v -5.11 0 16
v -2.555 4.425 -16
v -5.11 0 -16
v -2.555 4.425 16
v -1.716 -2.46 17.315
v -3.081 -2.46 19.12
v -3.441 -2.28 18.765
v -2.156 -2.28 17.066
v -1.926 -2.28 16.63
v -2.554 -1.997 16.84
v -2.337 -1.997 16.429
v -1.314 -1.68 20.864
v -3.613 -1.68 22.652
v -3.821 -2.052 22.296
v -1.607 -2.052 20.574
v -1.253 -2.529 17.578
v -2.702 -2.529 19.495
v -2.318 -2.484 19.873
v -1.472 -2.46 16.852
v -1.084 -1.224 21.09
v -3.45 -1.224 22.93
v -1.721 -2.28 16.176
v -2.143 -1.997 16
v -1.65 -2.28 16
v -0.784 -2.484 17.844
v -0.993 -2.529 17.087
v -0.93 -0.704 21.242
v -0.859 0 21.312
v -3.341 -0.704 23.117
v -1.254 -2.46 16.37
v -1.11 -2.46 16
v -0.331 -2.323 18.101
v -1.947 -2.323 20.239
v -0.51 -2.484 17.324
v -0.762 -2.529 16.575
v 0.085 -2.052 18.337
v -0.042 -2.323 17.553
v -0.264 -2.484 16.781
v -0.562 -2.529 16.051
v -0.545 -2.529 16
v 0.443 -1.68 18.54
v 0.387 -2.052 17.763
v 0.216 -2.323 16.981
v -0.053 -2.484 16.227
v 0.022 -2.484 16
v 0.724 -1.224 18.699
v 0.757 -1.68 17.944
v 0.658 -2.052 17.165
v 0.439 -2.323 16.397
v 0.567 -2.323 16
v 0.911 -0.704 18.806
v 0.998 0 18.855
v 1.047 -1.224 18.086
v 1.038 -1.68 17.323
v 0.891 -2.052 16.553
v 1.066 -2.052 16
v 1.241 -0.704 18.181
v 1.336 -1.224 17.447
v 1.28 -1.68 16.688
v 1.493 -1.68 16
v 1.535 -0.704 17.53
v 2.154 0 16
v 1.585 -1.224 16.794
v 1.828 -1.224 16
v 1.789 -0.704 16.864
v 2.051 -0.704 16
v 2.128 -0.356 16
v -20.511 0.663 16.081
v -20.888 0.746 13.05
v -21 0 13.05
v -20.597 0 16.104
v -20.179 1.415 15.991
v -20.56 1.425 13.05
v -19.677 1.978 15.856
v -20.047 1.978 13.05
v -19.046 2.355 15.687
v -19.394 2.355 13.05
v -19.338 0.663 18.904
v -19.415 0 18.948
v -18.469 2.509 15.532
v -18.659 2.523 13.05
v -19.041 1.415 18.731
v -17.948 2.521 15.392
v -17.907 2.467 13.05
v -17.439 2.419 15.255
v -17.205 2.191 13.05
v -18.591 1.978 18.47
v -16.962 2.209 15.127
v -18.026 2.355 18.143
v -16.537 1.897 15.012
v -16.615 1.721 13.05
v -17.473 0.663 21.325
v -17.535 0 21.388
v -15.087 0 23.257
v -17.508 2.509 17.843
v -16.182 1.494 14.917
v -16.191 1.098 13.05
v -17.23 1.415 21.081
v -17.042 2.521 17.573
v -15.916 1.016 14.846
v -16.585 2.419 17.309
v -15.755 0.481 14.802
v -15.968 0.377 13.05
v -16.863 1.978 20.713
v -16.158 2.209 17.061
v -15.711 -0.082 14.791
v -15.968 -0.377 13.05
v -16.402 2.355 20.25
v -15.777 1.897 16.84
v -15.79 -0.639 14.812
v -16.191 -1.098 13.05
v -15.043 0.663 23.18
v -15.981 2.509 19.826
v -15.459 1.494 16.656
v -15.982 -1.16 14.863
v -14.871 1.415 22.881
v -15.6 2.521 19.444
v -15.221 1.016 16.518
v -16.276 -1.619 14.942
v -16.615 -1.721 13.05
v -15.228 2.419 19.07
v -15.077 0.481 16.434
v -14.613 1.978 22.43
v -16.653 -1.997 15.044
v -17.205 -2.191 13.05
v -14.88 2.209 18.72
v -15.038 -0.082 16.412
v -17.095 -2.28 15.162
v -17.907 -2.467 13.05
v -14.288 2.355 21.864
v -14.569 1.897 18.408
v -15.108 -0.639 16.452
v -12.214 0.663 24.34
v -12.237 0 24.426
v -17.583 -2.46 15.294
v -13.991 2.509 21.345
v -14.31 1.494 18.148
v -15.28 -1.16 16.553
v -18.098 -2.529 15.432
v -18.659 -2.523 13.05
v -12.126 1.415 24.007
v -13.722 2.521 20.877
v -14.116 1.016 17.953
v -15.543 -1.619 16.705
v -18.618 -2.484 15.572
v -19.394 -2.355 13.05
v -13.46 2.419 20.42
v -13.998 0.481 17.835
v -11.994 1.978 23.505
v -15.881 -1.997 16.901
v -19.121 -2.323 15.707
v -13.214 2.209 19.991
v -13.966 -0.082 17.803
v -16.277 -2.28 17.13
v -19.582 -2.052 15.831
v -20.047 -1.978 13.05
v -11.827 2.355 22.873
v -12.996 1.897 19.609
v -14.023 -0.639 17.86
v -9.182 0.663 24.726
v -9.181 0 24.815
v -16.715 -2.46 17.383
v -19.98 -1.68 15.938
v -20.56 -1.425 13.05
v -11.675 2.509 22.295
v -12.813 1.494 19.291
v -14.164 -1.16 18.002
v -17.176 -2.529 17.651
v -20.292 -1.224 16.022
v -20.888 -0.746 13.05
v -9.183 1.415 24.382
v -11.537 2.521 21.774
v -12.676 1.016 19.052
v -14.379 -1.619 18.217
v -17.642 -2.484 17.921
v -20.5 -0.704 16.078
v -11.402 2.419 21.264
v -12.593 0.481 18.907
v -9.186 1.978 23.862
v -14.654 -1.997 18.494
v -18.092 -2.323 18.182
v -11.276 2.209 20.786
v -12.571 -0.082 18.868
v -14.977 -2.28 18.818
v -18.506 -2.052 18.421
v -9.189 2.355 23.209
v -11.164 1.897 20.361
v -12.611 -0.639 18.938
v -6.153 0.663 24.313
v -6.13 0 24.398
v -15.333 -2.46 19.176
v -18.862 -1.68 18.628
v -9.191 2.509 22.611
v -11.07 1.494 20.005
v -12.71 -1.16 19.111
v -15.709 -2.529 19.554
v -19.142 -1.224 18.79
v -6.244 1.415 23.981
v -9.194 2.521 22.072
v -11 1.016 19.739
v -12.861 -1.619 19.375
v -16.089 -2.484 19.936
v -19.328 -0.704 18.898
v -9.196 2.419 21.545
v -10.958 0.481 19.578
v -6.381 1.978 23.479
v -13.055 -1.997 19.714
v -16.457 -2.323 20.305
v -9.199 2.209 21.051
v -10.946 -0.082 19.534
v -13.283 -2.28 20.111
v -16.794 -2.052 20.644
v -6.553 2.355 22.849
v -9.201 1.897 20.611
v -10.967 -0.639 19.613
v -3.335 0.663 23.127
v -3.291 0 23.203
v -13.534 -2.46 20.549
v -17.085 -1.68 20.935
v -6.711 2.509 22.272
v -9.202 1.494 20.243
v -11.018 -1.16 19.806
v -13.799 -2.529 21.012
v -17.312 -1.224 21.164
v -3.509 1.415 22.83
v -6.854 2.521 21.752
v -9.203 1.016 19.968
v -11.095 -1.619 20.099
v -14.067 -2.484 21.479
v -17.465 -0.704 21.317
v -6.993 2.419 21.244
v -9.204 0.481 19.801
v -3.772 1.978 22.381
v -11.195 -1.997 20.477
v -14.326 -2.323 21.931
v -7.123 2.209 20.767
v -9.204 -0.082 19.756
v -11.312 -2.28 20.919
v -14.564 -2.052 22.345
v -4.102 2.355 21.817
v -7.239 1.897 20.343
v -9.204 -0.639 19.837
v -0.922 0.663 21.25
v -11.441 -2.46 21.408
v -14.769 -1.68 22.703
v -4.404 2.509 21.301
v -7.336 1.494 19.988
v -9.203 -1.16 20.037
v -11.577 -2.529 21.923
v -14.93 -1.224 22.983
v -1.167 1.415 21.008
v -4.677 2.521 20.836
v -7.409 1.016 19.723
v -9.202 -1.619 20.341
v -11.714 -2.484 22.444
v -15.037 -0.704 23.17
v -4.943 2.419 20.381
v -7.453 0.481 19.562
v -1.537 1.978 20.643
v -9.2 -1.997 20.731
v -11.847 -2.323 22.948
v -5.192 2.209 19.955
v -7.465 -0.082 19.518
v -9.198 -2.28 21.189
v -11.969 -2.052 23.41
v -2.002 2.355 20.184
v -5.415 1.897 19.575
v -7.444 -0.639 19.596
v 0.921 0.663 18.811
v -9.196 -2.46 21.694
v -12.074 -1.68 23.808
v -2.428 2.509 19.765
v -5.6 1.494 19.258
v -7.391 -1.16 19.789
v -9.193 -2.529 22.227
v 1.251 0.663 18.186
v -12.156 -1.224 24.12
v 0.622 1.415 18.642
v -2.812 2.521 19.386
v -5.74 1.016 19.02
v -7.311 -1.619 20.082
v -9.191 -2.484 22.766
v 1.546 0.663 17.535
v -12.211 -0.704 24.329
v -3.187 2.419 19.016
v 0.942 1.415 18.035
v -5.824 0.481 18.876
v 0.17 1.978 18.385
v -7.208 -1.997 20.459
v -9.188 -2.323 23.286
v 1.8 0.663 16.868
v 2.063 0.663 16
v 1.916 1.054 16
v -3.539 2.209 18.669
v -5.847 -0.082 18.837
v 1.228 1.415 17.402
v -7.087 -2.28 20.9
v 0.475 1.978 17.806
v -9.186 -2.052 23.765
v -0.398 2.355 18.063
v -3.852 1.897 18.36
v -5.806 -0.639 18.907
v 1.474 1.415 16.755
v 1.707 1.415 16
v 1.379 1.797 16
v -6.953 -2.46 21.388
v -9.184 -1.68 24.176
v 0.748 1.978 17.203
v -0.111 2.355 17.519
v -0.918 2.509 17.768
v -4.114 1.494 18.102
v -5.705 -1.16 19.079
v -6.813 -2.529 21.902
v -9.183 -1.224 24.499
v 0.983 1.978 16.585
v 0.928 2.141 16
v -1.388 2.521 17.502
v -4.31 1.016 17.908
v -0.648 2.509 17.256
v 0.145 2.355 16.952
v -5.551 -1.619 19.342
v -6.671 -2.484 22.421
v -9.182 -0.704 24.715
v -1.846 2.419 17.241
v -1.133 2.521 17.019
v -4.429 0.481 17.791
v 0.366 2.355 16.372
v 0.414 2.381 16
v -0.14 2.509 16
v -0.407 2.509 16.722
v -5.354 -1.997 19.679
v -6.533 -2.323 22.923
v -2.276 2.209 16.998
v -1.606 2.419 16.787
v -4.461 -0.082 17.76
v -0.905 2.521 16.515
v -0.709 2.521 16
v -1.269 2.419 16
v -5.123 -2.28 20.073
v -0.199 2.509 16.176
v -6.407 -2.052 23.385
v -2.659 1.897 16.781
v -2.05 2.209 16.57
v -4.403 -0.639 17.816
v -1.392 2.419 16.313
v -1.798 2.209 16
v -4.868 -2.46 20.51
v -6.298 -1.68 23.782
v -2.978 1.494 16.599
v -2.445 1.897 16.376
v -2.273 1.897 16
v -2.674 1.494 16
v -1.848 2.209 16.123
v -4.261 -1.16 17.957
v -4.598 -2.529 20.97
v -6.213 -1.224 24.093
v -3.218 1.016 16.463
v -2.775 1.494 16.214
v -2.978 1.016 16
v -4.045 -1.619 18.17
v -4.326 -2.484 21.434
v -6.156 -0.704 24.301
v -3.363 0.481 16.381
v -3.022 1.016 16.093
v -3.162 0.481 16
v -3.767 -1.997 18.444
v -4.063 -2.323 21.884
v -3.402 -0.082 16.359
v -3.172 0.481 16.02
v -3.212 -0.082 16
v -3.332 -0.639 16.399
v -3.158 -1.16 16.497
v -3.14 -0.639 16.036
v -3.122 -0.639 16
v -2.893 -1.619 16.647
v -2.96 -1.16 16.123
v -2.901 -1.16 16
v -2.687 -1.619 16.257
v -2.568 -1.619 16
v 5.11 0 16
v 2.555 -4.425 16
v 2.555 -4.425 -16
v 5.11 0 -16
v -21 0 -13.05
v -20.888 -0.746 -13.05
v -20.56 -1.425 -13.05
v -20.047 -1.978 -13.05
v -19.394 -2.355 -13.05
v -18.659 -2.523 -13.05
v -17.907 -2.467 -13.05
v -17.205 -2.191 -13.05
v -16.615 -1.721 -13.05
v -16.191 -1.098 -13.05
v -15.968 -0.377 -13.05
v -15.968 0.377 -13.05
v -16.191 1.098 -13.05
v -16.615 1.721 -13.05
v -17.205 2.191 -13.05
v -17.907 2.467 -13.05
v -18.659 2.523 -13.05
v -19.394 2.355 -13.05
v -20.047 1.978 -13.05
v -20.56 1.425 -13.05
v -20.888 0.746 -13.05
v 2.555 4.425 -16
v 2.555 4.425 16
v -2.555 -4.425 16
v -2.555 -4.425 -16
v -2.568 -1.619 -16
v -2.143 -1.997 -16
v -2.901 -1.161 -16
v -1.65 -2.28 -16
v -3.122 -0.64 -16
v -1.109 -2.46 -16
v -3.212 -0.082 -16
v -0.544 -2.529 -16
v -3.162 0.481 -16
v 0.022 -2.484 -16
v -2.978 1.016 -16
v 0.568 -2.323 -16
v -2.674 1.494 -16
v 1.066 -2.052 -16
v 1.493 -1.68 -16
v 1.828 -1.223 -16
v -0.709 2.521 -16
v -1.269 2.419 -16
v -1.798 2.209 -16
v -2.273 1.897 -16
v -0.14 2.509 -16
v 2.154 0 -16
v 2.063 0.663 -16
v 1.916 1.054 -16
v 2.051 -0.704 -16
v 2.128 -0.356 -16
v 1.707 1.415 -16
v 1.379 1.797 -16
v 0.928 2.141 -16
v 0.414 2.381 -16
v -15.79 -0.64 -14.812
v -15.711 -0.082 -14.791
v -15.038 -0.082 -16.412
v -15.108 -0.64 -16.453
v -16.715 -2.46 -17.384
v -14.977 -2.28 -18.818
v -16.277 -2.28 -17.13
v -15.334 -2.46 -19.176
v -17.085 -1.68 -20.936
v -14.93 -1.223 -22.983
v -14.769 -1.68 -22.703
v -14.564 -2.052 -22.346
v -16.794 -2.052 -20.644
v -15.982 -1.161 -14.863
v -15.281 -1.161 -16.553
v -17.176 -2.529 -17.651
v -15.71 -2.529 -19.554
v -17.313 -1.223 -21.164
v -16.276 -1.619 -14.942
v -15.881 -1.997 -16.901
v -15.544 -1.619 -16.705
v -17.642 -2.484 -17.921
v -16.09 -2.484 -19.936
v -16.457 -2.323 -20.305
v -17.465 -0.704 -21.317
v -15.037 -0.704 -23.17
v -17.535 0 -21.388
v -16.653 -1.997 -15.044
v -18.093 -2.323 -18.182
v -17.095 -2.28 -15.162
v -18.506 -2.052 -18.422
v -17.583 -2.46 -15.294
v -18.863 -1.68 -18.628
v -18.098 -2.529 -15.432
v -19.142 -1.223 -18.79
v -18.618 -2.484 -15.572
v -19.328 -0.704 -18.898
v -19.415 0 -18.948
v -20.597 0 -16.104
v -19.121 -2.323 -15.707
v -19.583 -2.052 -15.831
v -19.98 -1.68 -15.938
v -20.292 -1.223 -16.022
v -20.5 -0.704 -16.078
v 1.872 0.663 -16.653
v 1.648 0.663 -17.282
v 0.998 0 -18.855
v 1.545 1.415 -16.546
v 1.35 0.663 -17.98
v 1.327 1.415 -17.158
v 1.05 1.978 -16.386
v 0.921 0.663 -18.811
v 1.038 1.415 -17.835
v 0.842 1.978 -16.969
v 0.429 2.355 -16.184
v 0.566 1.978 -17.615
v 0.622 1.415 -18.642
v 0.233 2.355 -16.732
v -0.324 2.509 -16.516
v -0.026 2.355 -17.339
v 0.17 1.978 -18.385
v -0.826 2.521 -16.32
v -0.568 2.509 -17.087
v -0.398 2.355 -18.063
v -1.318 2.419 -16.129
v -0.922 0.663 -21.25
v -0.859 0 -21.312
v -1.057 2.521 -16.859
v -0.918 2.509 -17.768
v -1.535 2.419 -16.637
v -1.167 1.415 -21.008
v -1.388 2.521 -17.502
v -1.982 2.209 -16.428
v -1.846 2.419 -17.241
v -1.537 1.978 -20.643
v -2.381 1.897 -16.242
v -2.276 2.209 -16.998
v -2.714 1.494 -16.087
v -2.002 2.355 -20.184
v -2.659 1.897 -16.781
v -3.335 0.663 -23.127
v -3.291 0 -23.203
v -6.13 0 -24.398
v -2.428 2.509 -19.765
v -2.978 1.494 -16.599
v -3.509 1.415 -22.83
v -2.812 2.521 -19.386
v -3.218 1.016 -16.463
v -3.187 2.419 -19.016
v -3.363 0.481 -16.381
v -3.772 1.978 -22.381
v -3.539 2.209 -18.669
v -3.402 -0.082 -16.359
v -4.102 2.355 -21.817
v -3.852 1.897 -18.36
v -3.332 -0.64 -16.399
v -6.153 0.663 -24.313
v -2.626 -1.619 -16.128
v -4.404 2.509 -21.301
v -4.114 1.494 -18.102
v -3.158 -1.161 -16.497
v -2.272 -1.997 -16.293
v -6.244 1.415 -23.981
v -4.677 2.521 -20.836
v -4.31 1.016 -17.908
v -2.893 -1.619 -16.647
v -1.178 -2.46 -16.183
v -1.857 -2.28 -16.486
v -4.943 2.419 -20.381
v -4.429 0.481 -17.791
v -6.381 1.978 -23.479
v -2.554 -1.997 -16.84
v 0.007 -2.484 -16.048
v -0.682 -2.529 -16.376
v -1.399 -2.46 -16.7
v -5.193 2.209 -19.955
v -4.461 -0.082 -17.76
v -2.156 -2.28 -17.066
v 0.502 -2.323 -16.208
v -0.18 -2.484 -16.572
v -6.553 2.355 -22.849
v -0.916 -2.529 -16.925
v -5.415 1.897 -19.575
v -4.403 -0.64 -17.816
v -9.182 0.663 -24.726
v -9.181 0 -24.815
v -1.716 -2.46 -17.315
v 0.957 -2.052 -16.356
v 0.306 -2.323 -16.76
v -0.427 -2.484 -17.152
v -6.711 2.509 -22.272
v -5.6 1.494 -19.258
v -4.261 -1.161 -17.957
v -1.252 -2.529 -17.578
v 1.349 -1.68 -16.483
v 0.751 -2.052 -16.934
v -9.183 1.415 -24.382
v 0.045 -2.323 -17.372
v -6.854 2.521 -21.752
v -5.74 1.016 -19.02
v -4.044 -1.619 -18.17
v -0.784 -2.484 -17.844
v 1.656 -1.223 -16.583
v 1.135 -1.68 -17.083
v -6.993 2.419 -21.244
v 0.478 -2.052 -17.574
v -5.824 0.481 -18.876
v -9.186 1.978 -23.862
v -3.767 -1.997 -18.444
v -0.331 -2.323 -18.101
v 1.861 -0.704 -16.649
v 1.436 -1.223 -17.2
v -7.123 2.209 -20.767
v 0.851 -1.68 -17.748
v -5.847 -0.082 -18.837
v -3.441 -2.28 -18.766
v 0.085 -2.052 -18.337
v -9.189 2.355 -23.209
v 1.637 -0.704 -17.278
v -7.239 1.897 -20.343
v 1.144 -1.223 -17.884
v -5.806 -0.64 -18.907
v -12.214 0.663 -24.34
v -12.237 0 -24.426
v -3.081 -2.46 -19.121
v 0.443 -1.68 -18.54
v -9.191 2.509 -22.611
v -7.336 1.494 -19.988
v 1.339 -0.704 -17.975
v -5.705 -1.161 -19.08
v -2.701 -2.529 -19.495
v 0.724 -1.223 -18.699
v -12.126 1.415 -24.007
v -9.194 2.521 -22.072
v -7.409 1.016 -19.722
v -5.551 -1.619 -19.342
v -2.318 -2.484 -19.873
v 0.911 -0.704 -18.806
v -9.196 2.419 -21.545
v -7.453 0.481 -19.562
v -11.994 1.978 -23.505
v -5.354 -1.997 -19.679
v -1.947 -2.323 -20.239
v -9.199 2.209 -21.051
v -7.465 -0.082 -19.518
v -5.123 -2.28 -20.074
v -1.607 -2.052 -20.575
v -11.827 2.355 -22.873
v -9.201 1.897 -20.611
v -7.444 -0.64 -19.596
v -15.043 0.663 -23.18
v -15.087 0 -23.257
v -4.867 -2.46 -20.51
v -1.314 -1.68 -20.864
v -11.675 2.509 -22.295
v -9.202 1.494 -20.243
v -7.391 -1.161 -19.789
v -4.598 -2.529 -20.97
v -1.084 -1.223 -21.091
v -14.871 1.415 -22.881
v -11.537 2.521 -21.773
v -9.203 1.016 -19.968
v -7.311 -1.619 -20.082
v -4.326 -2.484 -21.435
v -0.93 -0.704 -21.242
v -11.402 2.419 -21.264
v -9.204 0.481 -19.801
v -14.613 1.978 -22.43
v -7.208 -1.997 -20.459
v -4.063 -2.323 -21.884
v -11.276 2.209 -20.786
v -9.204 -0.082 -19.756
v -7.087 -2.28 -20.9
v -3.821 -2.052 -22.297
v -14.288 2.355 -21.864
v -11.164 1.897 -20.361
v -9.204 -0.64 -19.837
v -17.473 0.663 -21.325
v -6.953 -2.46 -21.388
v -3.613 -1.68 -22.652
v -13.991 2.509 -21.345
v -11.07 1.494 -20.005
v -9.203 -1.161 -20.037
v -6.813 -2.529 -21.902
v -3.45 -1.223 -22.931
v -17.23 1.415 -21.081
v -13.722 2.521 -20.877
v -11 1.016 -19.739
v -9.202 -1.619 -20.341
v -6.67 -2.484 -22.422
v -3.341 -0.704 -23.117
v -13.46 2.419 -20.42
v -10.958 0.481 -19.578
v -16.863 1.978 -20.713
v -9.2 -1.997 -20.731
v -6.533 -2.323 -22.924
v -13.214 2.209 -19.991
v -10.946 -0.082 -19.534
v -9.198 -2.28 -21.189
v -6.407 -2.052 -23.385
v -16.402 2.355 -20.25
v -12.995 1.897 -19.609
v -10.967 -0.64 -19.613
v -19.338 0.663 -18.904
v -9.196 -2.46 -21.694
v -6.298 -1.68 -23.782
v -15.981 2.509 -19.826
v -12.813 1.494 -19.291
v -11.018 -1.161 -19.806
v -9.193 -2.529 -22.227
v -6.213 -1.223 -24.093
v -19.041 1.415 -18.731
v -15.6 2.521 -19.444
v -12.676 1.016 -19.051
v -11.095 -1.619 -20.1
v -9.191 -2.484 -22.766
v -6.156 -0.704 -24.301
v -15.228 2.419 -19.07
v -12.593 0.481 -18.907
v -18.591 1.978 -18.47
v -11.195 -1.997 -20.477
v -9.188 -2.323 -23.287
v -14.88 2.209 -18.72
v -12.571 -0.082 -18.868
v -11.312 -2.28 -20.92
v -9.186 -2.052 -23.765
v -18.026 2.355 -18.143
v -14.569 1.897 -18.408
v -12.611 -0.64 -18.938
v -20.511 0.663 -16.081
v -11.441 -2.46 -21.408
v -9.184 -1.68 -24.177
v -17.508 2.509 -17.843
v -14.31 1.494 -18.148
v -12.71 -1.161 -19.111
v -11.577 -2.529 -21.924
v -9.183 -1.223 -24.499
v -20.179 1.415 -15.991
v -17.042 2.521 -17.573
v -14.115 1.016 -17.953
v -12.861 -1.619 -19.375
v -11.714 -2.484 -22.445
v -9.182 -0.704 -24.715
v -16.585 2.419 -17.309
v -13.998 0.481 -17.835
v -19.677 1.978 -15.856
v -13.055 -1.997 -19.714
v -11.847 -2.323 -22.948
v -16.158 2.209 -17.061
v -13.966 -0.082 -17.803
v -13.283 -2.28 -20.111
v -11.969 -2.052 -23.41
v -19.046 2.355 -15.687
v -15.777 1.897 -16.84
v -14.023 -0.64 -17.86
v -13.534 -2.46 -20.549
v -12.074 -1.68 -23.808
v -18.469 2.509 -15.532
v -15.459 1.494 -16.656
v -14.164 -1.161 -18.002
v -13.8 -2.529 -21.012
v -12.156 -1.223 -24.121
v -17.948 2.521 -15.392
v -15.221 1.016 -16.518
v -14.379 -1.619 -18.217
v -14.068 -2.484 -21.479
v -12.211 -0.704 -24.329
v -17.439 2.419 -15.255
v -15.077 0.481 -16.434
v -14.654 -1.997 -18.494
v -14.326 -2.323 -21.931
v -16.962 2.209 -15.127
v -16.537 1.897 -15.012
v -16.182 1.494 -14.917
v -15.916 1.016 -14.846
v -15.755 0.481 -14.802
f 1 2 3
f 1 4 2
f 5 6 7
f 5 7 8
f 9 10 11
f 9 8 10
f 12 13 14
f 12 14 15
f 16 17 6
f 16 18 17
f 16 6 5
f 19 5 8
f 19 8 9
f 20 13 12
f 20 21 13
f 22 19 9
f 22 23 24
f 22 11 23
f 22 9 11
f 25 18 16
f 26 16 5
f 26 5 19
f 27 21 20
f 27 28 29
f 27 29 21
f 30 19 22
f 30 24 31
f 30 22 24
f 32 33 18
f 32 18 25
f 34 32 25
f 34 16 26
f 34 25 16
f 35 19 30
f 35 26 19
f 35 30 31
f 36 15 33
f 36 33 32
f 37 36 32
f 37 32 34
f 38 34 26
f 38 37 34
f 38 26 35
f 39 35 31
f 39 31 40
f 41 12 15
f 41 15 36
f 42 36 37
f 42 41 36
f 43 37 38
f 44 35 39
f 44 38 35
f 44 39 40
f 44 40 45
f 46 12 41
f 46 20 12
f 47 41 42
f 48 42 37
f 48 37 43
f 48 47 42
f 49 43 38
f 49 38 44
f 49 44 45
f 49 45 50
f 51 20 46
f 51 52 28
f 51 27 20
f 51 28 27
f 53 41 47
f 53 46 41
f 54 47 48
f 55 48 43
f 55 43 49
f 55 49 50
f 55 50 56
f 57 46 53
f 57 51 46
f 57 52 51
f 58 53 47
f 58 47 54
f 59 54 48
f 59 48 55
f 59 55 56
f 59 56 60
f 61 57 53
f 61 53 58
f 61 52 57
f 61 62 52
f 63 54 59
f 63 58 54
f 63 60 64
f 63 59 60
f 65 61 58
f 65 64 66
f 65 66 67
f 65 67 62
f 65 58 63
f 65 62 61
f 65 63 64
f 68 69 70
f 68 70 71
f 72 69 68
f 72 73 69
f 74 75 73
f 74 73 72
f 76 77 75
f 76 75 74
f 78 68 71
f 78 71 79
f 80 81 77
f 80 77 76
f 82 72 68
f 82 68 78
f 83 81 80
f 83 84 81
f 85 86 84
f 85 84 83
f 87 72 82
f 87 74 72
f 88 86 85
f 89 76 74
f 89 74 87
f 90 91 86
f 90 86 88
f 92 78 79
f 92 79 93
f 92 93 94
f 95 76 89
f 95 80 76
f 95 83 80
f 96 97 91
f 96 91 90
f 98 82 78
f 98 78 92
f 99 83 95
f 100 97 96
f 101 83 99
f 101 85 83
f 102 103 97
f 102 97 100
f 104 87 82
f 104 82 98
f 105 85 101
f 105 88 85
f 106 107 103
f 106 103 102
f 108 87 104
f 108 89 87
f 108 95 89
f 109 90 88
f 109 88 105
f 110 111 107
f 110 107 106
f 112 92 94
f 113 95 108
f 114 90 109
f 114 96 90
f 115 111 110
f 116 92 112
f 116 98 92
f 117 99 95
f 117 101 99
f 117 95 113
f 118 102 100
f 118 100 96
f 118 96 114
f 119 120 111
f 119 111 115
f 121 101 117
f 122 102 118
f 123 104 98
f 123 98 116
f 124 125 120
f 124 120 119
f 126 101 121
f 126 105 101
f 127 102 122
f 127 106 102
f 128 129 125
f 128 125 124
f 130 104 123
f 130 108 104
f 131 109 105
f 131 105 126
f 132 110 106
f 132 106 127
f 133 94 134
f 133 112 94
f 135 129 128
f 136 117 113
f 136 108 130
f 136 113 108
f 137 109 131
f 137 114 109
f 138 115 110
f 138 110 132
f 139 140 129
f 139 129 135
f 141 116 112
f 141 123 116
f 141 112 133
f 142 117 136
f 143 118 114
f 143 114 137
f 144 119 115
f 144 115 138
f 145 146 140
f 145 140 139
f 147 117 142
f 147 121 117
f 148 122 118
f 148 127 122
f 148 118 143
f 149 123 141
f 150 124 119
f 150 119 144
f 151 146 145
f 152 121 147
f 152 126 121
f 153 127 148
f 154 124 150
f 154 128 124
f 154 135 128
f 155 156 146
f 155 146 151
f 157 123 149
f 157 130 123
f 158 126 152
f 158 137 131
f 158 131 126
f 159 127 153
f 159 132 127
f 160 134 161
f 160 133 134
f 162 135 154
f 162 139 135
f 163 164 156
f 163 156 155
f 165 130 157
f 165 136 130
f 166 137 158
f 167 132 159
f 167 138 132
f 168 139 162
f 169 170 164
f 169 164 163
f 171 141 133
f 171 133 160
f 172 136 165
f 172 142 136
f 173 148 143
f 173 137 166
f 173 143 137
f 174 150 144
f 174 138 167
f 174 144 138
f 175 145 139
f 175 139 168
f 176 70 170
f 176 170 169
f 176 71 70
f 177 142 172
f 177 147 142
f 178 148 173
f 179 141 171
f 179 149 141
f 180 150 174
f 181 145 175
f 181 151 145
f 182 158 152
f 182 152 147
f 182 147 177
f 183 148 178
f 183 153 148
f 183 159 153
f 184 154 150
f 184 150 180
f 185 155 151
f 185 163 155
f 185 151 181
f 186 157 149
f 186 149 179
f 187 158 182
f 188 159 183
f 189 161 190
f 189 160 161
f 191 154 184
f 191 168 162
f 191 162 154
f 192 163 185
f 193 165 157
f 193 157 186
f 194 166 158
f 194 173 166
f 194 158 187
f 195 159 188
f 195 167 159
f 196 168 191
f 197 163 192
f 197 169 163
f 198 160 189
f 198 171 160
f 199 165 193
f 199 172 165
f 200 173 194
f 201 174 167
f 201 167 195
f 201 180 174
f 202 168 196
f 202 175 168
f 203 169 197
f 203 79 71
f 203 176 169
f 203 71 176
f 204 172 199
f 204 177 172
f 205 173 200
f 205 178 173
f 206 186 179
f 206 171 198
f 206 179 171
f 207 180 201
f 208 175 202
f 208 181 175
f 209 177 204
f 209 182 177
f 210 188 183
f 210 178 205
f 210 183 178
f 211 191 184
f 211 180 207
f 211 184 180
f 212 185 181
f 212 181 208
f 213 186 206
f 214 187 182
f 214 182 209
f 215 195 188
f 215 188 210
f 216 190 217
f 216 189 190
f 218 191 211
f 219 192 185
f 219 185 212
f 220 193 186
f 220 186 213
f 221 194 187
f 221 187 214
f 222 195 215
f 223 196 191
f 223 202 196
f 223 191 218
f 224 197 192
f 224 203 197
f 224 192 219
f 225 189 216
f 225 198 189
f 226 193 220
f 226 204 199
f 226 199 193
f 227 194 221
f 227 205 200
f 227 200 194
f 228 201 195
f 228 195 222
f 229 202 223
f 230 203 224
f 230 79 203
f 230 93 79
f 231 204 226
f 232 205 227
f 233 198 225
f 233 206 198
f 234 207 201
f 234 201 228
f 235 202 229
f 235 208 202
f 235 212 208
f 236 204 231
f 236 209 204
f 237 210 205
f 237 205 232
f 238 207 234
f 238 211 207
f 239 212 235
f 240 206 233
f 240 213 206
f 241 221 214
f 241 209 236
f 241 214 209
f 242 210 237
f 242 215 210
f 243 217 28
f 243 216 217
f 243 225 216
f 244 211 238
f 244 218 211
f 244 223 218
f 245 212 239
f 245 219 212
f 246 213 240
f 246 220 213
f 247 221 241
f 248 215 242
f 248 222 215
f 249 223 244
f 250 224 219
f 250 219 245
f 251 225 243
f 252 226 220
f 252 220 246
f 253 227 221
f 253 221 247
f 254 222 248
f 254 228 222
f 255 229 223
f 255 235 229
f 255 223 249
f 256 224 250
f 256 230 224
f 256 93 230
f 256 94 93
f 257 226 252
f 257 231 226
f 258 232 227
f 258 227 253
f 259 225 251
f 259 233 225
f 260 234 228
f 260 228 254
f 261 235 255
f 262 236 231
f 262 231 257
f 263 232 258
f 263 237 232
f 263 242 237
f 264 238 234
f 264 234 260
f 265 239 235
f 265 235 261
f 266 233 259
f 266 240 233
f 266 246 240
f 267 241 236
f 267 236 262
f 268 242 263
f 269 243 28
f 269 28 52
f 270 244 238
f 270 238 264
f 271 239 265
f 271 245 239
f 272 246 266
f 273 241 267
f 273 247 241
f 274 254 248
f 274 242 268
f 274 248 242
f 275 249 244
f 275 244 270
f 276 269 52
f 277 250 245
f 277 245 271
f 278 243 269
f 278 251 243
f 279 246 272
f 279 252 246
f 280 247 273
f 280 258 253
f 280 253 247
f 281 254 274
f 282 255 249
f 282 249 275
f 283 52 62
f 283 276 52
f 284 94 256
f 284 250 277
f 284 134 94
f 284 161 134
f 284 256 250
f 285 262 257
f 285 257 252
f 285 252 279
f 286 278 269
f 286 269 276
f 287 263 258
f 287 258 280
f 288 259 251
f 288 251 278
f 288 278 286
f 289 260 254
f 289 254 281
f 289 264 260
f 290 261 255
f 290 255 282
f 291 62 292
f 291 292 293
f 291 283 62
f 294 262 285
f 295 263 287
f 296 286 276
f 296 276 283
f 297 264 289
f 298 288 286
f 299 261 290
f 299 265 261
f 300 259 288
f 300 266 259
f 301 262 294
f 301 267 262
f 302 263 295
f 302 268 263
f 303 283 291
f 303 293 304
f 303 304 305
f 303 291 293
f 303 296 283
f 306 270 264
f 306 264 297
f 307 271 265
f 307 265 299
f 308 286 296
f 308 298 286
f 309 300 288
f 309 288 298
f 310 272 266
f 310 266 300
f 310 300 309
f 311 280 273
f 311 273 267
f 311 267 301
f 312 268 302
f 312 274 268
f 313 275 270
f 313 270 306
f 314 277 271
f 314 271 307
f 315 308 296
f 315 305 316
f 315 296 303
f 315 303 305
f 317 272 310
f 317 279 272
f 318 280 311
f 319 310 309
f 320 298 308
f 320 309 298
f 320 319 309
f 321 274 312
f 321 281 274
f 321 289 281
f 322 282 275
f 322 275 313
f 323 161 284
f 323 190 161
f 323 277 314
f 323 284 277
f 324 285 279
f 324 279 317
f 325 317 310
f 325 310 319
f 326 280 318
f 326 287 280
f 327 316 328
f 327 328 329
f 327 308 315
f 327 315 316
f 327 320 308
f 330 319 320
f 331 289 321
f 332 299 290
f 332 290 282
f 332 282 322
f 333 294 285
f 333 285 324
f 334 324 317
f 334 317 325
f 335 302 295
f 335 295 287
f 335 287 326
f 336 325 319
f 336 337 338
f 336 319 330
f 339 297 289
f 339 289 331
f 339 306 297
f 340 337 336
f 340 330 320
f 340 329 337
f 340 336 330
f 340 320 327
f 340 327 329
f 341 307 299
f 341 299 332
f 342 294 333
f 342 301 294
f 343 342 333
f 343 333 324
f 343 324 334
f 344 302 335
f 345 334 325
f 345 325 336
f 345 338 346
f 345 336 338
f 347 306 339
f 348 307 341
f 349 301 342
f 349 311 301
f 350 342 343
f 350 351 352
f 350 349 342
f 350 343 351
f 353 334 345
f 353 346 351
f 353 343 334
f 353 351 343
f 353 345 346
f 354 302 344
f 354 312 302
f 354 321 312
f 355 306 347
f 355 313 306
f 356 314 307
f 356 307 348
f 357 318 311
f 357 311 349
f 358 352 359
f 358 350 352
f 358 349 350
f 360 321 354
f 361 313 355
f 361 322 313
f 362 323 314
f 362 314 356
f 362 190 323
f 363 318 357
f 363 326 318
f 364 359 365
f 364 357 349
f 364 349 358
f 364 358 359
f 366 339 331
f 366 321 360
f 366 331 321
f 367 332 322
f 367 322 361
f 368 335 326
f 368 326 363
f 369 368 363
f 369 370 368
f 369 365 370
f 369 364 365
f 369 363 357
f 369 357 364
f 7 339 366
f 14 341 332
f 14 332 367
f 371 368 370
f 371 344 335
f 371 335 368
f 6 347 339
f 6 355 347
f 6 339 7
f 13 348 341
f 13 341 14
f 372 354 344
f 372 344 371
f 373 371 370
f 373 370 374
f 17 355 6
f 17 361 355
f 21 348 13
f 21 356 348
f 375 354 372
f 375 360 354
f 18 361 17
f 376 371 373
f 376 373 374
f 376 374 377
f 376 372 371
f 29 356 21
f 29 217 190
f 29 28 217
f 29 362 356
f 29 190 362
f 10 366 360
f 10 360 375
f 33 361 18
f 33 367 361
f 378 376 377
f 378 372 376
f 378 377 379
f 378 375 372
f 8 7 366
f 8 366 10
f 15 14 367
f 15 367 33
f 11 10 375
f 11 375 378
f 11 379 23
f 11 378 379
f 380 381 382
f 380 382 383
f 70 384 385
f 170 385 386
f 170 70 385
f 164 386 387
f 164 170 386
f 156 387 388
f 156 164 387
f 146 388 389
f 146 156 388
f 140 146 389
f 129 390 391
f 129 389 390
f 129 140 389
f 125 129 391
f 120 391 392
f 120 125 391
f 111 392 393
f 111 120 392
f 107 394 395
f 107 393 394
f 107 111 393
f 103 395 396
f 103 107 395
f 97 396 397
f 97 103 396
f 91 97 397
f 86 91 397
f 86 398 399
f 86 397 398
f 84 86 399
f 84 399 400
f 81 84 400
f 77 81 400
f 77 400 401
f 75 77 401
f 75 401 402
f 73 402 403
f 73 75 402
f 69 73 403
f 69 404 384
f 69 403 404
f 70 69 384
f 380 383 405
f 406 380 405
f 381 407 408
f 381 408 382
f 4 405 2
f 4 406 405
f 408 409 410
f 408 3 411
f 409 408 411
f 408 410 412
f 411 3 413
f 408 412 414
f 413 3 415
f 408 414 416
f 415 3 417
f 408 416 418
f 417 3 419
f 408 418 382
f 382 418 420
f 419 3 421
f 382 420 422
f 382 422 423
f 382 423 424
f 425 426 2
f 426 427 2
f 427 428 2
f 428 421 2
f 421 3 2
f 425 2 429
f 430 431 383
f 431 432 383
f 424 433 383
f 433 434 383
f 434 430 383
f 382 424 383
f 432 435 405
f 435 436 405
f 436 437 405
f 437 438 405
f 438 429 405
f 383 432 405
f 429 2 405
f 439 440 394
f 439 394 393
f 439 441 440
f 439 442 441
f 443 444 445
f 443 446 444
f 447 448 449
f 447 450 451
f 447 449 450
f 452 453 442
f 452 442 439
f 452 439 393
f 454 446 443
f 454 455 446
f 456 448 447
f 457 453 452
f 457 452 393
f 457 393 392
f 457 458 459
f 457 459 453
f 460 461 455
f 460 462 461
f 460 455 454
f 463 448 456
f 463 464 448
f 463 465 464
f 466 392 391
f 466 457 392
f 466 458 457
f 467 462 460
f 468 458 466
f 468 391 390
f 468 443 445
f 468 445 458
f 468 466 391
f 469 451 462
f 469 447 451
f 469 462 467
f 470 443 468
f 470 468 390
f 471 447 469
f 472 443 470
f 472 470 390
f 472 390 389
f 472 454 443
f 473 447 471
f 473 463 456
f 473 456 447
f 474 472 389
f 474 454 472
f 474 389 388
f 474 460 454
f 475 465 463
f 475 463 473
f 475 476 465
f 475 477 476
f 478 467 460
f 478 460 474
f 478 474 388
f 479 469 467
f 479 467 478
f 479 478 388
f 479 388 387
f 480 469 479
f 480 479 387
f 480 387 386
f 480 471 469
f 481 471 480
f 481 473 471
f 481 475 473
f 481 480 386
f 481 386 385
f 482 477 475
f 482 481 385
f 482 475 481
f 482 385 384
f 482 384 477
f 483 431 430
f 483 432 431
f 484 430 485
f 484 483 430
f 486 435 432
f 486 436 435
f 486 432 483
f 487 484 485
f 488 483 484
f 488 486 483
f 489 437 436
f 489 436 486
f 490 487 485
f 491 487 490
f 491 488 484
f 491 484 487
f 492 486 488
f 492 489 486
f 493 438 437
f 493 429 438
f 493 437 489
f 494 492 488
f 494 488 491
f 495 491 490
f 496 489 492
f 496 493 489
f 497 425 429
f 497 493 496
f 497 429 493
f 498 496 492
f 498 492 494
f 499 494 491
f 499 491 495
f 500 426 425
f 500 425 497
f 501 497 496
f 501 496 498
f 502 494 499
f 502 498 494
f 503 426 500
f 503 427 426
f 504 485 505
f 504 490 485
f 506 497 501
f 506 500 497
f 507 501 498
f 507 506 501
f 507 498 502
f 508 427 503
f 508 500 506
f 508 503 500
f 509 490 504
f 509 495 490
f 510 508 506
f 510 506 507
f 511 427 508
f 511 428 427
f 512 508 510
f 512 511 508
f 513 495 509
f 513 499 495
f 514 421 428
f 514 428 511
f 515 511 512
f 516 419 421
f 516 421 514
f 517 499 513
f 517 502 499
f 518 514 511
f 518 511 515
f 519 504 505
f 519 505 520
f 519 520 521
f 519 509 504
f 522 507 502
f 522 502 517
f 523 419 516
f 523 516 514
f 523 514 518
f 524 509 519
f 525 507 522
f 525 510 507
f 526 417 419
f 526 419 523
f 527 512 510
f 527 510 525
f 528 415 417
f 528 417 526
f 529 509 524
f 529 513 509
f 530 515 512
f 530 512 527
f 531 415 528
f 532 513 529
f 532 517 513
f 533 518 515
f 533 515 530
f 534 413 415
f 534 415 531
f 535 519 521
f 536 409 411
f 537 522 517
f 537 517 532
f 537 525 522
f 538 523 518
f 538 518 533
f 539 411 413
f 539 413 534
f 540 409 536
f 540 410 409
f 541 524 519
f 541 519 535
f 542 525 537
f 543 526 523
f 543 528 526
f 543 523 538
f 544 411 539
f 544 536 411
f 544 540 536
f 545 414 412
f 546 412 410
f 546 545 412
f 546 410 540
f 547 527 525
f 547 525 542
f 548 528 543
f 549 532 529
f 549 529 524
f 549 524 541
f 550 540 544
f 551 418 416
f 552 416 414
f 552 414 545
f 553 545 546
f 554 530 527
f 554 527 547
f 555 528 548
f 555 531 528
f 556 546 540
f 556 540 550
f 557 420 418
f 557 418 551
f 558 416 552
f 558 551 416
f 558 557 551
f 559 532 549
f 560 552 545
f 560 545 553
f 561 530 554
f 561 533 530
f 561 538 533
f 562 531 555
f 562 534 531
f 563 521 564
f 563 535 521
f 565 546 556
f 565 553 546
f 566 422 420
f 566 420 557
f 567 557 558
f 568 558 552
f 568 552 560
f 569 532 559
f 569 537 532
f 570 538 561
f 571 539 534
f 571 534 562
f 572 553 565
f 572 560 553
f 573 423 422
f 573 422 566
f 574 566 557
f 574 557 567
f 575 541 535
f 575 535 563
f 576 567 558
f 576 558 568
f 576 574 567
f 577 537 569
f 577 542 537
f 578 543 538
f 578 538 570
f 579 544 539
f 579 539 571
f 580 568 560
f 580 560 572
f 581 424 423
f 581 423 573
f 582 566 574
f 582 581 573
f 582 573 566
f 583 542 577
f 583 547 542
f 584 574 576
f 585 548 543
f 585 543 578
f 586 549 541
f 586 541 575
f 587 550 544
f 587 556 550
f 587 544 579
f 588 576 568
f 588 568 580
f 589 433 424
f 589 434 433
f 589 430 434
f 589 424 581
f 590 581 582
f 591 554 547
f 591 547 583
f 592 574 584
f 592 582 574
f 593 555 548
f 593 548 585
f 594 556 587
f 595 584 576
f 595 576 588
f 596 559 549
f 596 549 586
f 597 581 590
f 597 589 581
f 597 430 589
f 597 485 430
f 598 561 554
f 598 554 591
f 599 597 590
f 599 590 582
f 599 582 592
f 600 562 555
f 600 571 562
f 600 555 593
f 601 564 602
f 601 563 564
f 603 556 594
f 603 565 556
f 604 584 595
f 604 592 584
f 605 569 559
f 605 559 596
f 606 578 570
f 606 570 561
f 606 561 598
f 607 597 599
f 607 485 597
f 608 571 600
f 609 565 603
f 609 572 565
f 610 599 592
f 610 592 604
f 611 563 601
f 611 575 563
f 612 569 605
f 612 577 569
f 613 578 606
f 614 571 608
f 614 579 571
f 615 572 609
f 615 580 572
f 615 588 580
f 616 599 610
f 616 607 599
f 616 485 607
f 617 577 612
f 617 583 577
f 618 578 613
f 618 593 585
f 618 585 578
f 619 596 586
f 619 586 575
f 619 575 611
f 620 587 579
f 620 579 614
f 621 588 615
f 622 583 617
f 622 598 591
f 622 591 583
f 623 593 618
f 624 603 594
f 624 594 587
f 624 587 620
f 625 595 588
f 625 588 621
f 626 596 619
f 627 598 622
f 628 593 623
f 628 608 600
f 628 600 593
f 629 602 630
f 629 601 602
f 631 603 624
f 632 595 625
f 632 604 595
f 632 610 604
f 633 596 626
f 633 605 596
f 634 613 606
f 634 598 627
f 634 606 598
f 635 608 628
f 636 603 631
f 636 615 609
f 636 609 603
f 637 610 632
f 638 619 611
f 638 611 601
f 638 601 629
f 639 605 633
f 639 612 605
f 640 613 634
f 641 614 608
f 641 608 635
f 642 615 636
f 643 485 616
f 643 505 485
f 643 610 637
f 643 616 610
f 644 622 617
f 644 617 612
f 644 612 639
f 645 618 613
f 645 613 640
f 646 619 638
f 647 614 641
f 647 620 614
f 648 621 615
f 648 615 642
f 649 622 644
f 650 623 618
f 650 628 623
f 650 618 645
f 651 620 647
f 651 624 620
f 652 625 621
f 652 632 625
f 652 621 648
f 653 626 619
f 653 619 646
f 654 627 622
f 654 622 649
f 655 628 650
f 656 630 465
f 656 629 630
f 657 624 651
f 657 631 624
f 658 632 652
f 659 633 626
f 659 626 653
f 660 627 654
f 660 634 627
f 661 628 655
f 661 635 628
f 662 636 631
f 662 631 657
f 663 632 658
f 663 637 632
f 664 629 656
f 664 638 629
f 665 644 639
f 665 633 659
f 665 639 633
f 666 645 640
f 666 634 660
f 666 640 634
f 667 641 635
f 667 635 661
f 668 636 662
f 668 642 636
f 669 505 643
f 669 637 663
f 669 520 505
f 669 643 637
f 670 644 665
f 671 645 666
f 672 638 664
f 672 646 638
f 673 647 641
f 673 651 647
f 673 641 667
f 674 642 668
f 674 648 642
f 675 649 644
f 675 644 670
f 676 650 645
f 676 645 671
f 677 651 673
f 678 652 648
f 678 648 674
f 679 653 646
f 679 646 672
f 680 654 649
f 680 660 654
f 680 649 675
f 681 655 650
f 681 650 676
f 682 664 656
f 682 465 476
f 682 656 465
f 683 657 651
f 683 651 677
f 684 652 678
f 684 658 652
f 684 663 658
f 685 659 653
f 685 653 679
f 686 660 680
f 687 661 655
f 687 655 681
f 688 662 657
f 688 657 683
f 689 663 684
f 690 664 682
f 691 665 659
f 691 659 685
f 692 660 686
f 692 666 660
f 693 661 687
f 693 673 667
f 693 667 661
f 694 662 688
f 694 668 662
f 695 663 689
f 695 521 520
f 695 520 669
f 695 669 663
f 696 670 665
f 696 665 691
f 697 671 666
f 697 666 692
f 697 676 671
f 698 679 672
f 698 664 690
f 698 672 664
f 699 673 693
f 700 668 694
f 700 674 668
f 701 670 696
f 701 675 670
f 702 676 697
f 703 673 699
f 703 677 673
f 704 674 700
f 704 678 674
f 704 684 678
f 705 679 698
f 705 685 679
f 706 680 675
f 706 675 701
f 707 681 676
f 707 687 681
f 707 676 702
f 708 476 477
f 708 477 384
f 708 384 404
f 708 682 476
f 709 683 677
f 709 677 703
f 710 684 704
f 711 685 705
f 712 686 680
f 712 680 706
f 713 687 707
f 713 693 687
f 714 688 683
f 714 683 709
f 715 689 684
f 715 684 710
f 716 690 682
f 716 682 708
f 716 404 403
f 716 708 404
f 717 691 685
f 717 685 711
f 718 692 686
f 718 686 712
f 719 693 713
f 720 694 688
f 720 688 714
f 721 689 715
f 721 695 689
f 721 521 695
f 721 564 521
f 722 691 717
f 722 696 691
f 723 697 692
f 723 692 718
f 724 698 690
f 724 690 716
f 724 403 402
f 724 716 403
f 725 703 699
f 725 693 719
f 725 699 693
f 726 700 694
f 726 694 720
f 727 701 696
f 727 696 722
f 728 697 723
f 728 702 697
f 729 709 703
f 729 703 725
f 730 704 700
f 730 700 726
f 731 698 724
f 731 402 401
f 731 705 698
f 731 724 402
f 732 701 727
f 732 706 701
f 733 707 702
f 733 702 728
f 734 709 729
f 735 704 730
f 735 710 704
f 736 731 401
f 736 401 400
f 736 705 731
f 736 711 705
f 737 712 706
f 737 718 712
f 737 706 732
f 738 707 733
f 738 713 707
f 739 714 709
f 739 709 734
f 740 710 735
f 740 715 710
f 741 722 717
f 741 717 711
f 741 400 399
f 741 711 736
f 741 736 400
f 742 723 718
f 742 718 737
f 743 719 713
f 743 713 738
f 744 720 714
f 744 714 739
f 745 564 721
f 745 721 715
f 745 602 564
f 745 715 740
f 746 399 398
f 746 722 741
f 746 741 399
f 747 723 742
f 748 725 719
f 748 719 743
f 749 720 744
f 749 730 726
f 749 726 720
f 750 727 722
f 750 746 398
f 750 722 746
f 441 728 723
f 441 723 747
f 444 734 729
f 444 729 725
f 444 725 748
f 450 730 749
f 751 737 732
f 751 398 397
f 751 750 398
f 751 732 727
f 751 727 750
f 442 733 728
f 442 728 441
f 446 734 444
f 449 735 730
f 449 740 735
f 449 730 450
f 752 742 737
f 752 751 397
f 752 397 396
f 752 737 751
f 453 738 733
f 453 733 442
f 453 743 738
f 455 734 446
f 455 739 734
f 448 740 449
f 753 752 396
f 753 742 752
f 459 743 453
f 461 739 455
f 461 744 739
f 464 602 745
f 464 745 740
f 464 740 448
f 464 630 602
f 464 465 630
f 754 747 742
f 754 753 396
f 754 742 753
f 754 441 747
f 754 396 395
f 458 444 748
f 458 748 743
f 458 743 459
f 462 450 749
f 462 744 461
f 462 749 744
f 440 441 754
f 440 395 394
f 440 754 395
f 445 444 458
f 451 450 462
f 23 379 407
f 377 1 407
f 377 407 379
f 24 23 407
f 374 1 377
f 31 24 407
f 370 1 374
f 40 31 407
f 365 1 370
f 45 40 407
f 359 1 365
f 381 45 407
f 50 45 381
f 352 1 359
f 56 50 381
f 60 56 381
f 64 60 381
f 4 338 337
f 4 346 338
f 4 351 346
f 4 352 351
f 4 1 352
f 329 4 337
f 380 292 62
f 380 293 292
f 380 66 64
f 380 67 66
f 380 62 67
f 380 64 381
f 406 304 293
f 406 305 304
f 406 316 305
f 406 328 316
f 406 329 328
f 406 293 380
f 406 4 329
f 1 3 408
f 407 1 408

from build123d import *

# Parameters (mm, degrees)
SKETCH1_R                = 2.53
BOSS_EXTRUDE1_DEPTH      = 16
BOSS_EXTRUDE1_DEPTH_BACK = 16


with BuildPart() as part:
    # Sweep1: sweep along a path in Sketch2
    with BuildLine(Plane(origin=(0, 0, 0), x_dir=(1, 0, 0), z_dir=(0, 1, 0))) as sweep1_path:
        Line((0, -13.05), (0, 13.05))
        ThreePointArc((0, 13.05), (-9.235, 22.285), (-18.47, 13.05))
        Line((-18.47, 13.05), (-18.47, -13.05))
        ThreePointArc((-18.47, -13.05), (-9.235, -22.285), (0, -13.05))
    # Sketch1 → Sweep1 (sweep)
    with BuildSketch(Plane.XY):
        Circle(SKETCH1_R)
    sweep(path=sweep1_path.line)

    # Sketch3 → Boss-Extrude1 (add, two sides: drawn at the far end of the back side and taken through both)
    with BuildSketch(Plane.XY.offset(-BOSS_EXTRUDE1_DEPTH_BACK)):
        Polygon((-2.554774941, 4.425), (-5.109549882, 0), (-2.554774941, -4.425), (2.554774941, -4.425), (5.109549882, 0), (2.554774941, 4.425), align=None)
    extrude(amount=BOSS_EXTRUDE1_DEPTH + BOSS_EXTRUDE1_DEPTH_BACK)


solid = part.part
